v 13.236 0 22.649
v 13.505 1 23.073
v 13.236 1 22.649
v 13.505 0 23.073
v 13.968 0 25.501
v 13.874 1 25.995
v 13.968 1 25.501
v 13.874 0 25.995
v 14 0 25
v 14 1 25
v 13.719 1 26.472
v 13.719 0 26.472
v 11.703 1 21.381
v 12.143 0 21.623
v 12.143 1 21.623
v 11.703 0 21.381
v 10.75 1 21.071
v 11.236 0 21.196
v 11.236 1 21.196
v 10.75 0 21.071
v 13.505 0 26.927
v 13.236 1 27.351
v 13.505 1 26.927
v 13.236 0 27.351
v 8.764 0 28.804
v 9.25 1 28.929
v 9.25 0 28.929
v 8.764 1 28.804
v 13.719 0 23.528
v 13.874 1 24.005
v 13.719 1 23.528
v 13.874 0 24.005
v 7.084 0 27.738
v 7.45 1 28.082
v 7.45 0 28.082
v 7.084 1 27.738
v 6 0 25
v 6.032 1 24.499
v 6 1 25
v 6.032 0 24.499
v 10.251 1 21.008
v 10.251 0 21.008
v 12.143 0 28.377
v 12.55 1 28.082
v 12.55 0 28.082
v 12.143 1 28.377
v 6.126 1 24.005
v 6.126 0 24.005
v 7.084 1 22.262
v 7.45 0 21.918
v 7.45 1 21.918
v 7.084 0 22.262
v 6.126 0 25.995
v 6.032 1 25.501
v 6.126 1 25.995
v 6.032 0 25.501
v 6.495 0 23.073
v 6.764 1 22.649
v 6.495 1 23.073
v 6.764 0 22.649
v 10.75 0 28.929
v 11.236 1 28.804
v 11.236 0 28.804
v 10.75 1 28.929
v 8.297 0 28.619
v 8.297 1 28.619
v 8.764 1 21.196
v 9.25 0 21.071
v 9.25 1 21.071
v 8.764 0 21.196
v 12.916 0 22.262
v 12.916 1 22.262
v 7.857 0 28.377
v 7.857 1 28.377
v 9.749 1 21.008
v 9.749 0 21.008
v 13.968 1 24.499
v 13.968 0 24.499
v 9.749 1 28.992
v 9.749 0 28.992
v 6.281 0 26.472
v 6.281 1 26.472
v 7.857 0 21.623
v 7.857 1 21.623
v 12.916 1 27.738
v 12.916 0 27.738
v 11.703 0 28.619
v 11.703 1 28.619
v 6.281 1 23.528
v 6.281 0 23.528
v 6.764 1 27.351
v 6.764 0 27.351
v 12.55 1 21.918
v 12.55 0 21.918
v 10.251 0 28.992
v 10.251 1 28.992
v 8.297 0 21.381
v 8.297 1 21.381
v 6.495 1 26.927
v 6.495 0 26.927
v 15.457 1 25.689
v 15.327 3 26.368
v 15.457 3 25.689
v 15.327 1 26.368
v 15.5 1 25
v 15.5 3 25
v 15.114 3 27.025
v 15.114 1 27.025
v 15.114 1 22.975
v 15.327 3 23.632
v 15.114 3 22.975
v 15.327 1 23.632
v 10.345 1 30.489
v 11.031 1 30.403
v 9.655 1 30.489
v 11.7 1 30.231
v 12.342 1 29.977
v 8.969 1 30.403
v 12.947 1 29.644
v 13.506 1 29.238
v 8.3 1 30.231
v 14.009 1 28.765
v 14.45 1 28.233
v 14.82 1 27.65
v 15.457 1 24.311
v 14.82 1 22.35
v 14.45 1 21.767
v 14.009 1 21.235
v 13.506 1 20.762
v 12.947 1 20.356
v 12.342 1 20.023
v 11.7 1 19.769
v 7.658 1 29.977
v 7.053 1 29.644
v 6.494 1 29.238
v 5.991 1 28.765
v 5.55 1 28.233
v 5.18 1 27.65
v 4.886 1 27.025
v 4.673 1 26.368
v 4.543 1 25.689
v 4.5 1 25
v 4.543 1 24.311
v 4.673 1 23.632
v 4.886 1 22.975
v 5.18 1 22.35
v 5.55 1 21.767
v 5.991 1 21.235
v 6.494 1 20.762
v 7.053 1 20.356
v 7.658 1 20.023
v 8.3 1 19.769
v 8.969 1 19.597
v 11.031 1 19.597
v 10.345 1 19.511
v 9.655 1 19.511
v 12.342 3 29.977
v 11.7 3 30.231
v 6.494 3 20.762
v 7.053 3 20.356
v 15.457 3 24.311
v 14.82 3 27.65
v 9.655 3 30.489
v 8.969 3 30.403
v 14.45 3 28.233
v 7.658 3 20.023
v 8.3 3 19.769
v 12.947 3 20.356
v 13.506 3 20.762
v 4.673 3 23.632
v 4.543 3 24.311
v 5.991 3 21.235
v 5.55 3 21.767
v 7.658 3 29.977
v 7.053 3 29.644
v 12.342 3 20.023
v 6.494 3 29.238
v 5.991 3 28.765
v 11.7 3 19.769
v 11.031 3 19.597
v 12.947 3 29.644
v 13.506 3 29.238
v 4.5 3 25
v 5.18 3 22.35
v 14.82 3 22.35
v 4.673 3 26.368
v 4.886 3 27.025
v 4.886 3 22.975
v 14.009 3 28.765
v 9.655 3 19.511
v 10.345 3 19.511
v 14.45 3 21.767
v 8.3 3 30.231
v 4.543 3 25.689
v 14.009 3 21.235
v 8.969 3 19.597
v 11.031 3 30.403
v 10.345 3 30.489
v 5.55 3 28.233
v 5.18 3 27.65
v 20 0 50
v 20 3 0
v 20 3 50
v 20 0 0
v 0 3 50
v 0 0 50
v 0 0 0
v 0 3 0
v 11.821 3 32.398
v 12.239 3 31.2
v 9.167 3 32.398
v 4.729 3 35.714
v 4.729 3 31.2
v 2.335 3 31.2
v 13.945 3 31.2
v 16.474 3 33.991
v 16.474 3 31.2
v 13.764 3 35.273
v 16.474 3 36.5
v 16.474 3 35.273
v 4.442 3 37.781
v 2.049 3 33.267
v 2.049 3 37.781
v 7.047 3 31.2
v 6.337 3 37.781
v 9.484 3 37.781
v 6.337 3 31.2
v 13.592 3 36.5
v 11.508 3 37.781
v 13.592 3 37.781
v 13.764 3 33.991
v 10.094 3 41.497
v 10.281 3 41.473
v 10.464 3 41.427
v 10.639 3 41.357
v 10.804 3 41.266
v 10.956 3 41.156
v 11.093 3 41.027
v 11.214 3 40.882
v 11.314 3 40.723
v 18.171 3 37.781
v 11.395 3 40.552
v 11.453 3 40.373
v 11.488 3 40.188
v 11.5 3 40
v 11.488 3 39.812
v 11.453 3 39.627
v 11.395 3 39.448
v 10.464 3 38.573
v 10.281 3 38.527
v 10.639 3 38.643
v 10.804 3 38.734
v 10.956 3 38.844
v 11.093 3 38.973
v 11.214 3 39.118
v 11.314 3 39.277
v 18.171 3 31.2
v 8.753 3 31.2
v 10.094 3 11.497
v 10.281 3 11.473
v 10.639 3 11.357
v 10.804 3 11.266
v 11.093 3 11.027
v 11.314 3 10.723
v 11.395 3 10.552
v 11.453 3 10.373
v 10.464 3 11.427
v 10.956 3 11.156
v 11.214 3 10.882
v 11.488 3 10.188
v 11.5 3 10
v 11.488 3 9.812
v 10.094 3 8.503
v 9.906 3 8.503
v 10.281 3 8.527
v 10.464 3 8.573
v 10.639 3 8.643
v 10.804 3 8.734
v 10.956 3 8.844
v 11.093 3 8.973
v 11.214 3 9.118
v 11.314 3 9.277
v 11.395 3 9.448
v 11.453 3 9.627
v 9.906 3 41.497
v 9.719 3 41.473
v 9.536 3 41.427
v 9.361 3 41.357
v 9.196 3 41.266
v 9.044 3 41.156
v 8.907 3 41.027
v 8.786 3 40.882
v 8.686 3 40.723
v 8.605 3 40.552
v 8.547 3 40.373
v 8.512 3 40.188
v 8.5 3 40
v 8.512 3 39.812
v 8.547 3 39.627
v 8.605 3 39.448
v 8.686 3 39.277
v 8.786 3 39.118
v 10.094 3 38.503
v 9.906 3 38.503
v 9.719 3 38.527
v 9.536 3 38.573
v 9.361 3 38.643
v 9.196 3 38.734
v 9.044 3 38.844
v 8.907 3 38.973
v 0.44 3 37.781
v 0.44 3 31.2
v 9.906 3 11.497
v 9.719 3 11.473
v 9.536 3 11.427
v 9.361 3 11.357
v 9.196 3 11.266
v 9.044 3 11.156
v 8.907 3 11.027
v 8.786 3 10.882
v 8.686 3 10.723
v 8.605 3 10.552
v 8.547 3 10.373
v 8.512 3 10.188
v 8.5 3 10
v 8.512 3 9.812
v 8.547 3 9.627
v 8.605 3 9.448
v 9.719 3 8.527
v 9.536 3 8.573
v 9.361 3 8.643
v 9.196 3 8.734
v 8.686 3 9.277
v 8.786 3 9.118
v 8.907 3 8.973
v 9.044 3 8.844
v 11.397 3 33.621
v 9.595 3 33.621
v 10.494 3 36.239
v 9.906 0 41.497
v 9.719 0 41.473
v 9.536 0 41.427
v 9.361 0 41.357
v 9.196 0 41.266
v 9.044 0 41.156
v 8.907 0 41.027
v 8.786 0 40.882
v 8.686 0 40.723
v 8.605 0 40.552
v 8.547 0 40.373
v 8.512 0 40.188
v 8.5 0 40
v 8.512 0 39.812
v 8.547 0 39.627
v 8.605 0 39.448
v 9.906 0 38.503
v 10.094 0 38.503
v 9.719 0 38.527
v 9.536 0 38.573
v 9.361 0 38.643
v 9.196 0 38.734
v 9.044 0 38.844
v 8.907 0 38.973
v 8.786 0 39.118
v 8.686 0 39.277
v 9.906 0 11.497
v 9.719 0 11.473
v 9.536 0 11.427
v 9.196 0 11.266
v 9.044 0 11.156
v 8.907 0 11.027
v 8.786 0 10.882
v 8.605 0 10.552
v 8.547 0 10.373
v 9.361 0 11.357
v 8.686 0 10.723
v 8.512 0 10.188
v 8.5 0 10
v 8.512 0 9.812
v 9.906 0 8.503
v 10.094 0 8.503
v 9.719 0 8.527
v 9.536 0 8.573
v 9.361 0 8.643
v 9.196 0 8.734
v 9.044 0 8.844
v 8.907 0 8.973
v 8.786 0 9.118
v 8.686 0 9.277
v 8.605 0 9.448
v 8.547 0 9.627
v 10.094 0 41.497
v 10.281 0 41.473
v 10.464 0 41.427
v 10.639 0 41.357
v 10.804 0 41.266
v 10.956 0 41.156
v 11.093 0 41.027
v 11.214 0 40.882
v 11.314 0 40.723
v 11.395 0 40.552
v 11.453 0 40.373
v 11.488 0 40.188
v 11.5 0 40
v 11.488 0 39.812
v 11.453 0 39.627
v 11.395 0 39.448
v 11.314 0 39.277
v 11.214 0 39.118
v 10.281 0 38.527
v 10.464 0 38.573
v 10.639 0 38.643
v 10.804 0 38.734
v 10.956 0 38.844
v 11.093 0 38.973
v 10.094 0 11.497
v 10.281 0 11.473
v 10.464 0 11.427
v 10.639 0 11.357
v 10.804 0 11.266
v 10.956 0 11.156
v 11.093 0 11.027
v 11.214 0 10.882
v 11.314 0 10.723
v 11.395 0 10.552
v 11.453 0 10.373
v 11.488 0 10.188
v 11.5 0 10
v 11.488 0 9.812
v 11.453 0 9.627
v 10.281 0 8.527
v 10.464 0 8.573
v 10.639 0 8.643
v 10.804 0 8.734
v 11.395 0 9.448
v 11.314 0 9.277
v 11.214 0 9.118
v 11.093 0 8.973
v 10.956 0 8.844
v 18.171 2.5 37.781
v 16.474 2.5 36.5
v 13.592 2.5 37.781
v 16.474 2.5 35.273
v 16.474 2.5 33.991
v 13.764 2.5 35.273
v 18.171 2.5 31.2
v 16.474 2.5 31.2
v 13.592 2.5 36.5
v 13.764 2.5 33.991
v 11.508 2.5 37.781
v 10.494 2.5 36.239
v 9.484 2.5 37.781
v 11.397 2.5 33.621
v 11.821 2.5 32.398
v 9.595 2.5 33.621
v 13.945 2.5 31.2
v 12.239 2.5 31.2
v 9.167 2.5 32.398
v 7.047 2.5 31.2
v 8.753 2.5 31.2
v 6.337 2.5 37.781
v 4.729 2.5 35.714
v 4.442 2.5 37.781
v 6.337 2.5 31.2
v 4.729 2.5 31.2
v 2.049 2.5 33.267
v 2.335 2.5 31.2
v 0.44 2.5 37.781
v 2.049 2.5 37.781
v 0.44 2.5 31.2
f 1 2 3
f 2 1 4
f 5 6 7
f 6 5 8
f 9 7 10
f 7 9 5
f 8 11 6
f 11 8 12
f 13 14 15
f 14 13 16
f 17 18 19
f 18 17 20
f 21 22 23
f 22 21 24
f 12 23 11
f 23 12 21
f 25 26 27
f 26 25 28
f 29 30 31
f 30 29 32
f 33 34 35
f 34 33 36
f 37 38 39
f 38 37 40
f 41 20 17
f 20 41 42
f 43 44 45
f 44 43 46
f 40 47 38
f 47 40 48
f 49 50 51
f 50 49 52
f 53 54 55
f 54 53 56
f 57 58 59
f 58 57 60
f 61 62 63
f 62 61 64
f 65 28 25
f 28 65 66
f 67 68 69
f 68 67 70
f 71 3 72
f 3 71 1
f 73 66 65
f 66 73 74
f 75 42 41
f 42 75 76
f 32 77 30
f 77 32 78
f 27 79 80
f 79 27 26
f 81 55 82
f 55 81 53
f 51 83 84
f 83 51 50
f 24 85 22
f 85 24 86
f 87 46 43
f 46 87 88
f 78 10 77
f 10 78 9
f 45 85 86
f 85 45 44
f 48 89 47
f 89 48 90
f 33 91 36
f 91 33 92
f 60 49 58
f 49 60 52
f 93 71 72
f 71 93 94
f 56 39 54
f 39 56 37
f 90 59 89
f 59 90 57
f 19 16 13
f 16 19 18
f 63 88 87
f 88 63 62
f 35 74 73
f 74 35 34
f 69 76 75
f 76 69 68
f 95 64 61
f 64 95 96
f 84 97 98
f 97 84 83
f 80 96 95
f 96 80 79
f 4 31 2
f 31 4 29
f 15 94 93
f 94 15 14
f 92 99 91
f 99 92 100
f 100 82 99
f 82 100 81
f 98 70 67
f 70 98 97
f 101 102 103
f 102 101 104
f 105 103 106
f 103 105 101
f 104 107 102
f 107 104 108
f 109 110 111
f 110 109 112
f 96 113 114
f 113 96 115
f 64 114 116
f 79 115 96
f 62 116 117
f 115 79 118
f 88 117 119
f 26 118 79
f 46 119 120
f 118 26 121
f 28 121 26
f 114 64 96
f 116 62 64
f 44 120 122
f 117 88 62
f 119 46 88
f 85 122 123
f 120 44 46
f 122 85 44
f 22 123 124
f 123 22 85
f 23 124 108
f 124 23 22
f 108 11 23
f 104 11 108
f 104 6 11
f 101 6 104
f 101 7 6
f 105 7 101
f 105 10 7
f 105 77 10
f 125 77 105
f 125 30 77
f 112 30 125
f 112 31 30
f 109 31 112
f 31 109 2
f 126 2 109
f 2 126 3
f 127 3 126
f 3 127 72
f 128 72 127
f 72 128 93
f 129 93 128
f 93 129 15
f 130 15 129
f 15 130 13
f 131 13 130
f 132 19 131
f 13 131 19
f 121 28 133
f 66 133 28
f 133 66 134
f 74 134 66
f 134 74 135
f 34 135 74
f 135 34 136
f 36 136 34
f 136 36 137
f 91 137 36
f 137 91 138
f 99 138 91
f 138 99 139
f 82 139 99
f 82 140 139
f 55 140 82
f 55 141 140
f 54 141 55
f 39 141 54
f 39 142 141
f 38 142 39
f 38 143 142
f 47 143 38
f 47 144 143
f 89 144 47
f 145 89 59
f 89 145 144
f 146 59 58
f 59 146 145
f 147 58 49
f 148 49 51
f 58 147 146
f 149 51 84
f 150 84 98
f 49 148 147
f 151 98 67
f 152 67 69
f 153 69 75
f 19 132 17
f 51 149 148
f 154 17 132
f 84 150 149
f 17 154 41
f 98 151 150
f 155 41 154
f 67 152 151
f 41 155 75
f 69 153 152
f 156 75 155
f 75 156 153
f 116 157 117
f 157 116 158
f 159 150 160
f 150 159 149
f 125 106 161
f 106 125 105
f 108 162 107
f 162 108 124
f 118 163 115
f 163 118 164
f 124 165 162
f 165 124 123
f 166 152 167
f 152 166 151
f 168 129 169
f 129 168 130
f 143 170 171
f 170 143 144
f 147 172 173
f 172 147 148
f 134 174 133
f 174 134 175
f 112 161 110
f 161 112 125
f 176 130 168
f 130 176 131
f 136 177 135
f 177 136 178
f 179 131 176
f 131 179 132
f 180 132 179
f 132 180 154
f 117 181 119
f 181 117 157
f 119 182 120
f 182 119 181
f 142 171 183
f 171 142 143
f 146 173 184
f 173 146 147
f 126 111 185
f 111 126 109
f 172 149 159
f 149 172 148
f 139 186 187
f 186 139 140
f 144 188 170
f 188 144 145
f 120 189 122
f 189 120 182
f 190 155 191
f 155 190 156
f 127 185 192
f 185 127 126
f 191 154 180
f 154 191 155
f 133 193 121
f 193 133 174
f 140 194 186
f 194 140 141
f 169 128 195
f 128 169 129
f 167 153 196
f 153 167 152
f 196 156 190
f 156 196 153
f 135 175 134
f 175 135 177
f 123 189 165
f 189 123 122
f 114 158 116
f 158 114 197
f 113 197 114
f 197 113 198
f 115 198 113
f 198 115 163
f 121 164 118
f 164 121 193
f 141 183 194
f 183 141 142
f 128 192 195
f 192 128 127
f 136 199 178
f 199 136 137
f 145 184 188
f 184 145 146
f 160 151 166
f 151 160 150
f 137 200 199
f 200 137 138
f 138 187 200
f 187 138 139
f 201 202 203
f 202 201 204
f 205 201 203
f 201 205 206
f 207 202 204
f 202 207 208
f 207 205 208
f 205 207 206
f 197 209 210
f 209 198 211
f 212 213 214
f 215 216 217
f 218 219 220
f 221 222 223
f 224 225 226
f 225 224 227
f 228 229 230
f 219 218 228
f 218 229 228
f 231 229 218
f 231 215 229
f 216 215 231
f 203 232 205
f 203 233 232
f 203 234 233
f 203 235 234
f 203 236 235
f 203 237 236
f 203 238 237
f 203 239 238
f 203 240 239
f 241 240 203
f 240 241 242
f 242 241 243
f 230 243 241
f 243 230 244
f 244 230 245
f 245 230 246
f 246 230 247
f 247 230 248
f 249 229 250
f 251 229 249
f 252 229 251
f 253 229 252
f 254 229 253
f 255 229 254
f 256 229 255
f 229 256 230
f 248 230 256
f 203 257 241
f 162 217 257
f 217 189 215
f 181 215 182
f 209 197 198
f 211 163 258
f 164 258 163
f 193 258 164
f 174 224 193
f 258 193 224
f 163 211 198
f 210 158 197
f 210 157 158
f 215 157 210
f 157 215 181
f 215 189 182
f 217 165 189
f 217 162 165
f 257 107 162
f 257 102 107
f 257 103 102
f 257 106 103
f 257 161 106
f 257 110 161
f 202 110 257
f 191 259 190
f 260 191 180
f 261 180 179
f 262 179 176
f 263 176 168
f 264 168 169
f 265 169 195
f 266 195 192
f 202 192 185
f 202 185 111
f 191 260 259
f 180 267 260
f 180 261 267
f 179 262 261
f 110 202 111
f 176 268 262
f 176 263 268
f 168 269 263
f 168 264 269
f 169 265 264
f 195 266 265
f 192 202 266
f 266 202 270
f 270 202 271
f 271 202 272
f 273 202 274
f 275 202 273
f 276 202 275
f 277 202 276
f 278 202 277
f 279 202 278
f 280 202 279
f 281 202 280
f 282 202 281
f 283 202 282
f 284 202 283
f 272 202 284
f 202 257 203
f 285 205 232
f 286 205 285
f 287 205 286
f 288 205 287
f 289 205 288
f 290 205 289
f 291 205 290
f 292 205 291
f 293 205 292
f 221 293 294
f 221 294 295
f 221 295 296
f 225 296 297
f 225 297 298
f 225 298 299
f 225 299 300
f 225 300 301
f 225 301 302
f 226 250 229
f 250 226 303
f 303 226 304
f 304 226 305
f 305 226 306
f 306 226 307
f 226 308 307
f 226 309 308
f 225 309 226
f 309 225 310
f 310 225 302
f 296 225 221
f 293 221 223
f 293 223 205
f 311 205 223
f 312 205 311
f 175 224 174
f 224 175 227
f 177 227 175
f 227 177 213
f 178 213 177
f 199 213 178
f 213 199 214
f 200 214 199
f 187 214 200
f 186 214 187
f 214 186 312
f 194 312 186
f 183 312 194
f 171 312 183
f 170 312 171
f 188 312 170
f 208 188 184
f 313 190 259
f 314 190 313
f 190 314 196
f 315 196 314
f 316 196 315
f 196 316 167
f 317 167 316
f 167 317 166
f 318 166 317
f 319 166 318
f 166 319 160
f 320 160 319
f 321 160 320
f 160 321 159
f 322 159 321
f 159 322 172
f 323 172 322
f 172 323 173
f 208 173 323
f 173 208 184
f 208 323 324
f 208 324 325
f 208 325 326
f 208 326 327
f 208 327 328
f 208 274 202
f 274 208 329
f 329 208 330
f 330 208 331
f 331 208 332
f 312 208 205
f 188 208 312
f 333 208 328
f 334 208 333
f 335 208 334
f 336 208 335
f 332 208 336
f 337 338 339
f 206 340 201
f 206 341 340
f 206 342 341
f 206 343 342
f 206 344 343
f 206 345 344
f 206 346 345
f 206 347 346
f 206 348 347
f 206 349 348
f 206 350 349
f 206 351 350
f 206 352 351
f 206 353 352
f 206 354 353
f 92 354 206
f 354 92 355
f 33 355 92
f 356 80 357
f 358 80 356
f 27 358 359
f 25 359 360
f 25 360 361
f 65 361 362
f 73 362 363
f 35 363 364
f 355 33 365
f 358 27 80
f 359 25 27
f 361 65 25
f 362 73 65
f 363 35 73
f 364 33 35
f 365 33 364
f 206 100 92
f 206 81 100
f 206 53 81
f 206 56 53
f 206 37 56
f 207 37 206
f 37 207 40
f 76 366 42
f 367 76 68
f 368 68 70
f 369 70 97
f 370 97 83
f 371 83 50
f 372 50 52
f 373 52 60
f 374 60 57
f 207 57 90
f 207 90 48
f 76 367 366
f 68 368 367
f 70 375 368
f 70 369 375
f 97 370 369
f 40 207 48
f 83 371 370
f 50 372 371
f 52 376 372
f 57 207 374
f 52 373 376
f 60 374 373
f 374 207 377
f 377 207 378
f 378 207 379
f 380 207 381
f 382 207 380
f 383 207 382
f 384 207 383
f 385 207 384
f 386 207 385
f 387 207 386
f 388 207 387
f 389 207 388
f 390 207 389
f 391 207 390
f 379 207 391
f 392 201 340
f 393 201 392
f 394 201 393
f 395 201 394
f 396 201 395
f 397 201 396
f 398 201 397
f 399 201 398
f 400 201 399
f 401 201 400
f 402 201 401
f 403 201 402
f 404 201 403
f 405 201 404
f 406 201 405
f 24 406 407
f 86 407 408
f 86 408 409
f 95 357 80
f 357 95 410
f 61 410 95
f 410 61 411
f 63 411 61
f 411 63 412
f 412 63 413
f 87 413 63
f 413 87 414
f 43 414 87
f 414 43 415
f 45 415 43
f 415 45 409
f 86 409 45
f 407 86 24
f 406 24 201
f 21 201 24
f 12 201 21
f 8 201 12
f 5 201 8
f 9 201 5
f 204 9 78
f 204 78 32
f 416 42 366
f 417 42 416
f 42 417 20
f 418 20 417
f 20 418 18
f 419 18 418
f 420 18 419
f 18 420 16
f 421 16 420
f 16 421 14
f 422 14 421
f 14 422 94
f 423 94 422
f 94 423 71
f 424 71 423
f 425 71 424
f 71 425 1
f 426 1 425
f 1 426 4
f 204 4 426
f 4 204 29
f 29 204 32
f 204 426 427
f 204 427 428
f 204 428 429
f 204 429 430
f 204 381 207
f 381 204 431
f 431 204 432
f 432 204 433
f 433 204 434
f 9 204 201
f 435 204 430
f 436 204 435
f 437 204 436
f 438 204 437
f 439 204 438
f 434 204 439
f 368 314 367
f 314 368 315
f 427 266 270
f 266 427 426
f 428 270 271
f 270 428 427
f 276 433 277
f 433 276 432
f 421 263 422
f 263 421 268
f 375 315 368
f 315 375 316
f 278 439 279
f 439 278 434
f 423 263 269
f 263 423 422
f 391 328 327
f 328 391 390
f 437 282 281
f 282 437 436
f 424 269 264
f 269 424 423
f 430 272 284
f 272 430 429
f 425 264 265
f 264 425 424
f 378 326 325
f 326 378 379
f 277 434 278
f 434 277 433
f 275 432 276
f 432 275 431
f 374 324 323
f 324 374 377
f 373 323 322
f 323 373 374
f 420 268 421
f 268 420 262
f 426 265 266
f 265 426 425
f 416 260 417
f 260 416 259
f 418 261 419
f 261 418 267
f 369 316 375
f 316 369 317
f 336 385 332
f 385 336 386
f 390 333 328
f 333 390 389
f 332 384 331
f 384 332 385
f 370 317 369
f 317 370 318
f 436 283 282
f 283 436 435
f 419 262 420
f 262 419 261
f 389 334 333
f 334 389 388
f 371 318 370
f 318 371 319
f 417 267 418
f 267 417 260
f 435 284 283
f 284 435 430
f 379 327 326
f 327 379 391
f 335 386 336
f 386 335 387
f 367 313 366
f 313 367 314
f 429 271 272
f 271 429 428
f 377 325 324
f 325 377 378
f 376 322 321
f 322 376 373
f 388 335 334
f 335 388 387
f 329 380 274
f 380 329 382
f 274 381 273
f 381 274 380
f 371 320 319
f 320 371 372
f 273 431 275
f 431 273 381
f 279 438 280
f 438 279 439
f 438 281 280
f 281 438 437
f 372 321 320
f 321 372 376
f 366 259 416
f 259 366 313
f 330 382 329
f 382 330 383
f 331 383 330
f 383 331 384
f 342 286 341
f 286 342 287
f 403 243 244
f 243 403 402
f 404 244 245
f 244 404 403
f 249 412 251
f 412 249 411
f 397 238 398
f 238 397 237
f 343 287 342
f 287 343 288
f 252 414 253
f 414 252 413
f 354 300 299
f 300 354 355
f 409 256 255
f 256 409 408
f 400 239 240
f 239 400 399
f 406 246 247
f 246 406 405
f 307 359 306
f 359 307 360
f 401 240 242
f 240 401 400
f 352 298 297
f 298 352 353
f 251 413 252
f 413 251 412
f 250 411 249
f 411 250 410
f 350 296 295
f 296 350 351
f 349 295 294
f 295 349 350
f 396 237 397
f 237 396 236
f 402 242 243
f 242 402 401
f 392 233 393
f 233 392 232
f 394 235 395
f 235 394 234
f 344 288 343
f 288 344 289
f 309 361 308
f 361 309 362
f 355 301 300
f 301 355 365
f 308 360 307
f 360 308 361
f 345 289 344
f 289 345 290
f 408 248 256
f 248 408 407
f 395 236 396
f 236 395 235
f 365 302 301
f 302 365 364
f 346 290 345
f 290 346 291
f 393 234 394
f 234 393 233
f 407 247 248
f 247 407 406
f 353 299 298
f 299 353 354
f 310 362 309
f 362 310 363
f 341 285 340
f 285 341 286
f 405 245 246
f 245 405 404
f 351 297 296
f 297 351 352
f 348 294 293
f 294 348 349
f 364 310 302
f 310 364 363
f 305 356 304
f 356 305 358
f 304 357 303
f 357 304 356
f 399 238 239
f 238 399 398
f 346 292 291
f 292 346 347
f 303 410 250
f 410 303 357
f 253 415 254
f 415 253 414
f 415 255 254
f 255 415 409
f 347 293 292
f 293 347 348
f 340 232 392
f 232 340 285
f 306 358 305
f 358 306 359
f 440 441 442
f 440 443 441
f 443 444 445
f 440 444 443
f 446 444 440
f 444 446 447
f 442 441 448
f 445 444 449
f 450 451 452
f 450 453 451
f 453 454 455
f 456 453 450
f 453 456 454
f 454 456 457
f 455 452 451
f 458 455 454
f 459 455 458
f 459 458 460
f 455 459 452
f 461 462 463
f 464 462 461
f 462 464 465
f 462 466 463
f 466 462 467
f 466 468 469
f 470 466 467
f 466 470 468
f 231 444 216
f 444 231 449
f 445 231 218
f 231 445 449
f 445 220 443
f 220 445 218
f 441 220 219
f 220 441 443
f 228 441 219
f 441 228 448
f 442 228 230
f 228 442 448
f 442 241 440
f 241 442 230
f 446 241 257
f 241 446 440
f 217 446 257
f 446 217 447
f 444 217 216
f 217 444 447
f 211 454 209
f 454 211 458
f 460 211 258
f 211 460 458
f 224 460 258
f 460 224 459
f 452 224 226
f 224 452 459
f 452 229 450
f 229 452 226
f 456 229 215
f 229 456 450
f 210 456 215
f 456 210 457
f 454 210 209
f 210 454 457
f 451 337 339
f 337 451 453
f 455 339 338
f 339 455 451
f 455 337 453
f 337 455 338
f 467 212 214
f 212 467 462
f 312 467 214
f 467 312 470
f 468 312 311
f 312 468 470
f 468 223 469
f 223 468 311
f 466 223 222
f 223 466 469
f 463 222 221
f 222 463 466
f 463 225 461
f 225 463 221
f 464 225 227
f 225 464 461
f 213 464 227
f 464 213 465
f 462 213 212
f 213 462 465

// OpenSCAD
// file: configuration.scad
// Increase this if your slicer or printer make holes too tight.
extra_radius = 0; // 0.1;

// OD = outside diameter, corner to corner.
m3_nut_od = 6.1;
m3_nut_radius = m3_nut_od/2 + 0.2 + extra_radius;
m3_nut_h = 2.4;
m3_nyloc_h = 3.9;
m3_washer_radius = 3.5 + extra_radius;

m4_nut_od = 7.8;
m4_nut_radius = m4_nut_od/2 + 0.2 + extra_radius;
m4_washer_radius = 4.4 + extra_radius;

// Major diameter of metric 3mm thread.
m3_major = 3;
m3_radius = m3_major/2 + extra_radius;
m3_wide_radius = m3_major/2 + extra_radius + 0.2;

// Major diameter of metric 4mm thread.
m4_major = 4;
m4_radius = m4_major/2 + extra_radius;
m4_wide_radius = m4_major/2 + extra_radius + 0.2;

// M6 Radius
m6_radius = 6/2;

// No4 Self Tapper pilot hole radius
no4_pilot_radius = 2.35/2;

// NEMA17 stepper motors.
motor_shaft_diameter = 5;
motor_shaft_radius = motor_shaft_diameter/2 + extra_radius;

// Frame brackets. M3x8mm screws work best with 3.6 mm brackets.
thickness = 4.0; //3.6 on 1515

// OpenBeam or Misumi. Currently only 15x15 mm, but there is a plan
// to make models more parametric and allow 20x20 mm in the future.
extrusion = 20;

// Placement for the NEMA17 stepper motors.
motor_offset = 44;
motor_length = 47;

separation = 38;  // Distance between ball joint mounting faces.

extrusion_fin_d = 1;

vertex_radius = 40.5; //set to 36 for 1515
vertex_x_offset = 7.25; // offset of the horizontal extrusion to the vertical one in X axis
vertex_y_offset = 39 ;//27; // offset of the horizontal extrusion to the vertical one in Y axis
// main file
include <configuration.scad>;

height=5;
$fn=50;

difference()
{
    cube([20,3,50]);
    translate([10,height,10])
        rotate([90,0,0])
            cylinder(h=height+2,r=1.5);
    translate([10,height,40])
        rotate([90,0,0])
            cylinder(h=height+2,r=1.5);
    translate([10,height,25])
        rotate([90,0,0])
        {
            cylinder(h=height+2,r=4);
            cylinder(h=height-1,r=5.5);
        }
    translate([19,2.5,31.2])
        rotate([90,0,180])
            linear_extrude(1)
                text("FAN", size=6.5, font="Orbitron:style=Bold");
}
